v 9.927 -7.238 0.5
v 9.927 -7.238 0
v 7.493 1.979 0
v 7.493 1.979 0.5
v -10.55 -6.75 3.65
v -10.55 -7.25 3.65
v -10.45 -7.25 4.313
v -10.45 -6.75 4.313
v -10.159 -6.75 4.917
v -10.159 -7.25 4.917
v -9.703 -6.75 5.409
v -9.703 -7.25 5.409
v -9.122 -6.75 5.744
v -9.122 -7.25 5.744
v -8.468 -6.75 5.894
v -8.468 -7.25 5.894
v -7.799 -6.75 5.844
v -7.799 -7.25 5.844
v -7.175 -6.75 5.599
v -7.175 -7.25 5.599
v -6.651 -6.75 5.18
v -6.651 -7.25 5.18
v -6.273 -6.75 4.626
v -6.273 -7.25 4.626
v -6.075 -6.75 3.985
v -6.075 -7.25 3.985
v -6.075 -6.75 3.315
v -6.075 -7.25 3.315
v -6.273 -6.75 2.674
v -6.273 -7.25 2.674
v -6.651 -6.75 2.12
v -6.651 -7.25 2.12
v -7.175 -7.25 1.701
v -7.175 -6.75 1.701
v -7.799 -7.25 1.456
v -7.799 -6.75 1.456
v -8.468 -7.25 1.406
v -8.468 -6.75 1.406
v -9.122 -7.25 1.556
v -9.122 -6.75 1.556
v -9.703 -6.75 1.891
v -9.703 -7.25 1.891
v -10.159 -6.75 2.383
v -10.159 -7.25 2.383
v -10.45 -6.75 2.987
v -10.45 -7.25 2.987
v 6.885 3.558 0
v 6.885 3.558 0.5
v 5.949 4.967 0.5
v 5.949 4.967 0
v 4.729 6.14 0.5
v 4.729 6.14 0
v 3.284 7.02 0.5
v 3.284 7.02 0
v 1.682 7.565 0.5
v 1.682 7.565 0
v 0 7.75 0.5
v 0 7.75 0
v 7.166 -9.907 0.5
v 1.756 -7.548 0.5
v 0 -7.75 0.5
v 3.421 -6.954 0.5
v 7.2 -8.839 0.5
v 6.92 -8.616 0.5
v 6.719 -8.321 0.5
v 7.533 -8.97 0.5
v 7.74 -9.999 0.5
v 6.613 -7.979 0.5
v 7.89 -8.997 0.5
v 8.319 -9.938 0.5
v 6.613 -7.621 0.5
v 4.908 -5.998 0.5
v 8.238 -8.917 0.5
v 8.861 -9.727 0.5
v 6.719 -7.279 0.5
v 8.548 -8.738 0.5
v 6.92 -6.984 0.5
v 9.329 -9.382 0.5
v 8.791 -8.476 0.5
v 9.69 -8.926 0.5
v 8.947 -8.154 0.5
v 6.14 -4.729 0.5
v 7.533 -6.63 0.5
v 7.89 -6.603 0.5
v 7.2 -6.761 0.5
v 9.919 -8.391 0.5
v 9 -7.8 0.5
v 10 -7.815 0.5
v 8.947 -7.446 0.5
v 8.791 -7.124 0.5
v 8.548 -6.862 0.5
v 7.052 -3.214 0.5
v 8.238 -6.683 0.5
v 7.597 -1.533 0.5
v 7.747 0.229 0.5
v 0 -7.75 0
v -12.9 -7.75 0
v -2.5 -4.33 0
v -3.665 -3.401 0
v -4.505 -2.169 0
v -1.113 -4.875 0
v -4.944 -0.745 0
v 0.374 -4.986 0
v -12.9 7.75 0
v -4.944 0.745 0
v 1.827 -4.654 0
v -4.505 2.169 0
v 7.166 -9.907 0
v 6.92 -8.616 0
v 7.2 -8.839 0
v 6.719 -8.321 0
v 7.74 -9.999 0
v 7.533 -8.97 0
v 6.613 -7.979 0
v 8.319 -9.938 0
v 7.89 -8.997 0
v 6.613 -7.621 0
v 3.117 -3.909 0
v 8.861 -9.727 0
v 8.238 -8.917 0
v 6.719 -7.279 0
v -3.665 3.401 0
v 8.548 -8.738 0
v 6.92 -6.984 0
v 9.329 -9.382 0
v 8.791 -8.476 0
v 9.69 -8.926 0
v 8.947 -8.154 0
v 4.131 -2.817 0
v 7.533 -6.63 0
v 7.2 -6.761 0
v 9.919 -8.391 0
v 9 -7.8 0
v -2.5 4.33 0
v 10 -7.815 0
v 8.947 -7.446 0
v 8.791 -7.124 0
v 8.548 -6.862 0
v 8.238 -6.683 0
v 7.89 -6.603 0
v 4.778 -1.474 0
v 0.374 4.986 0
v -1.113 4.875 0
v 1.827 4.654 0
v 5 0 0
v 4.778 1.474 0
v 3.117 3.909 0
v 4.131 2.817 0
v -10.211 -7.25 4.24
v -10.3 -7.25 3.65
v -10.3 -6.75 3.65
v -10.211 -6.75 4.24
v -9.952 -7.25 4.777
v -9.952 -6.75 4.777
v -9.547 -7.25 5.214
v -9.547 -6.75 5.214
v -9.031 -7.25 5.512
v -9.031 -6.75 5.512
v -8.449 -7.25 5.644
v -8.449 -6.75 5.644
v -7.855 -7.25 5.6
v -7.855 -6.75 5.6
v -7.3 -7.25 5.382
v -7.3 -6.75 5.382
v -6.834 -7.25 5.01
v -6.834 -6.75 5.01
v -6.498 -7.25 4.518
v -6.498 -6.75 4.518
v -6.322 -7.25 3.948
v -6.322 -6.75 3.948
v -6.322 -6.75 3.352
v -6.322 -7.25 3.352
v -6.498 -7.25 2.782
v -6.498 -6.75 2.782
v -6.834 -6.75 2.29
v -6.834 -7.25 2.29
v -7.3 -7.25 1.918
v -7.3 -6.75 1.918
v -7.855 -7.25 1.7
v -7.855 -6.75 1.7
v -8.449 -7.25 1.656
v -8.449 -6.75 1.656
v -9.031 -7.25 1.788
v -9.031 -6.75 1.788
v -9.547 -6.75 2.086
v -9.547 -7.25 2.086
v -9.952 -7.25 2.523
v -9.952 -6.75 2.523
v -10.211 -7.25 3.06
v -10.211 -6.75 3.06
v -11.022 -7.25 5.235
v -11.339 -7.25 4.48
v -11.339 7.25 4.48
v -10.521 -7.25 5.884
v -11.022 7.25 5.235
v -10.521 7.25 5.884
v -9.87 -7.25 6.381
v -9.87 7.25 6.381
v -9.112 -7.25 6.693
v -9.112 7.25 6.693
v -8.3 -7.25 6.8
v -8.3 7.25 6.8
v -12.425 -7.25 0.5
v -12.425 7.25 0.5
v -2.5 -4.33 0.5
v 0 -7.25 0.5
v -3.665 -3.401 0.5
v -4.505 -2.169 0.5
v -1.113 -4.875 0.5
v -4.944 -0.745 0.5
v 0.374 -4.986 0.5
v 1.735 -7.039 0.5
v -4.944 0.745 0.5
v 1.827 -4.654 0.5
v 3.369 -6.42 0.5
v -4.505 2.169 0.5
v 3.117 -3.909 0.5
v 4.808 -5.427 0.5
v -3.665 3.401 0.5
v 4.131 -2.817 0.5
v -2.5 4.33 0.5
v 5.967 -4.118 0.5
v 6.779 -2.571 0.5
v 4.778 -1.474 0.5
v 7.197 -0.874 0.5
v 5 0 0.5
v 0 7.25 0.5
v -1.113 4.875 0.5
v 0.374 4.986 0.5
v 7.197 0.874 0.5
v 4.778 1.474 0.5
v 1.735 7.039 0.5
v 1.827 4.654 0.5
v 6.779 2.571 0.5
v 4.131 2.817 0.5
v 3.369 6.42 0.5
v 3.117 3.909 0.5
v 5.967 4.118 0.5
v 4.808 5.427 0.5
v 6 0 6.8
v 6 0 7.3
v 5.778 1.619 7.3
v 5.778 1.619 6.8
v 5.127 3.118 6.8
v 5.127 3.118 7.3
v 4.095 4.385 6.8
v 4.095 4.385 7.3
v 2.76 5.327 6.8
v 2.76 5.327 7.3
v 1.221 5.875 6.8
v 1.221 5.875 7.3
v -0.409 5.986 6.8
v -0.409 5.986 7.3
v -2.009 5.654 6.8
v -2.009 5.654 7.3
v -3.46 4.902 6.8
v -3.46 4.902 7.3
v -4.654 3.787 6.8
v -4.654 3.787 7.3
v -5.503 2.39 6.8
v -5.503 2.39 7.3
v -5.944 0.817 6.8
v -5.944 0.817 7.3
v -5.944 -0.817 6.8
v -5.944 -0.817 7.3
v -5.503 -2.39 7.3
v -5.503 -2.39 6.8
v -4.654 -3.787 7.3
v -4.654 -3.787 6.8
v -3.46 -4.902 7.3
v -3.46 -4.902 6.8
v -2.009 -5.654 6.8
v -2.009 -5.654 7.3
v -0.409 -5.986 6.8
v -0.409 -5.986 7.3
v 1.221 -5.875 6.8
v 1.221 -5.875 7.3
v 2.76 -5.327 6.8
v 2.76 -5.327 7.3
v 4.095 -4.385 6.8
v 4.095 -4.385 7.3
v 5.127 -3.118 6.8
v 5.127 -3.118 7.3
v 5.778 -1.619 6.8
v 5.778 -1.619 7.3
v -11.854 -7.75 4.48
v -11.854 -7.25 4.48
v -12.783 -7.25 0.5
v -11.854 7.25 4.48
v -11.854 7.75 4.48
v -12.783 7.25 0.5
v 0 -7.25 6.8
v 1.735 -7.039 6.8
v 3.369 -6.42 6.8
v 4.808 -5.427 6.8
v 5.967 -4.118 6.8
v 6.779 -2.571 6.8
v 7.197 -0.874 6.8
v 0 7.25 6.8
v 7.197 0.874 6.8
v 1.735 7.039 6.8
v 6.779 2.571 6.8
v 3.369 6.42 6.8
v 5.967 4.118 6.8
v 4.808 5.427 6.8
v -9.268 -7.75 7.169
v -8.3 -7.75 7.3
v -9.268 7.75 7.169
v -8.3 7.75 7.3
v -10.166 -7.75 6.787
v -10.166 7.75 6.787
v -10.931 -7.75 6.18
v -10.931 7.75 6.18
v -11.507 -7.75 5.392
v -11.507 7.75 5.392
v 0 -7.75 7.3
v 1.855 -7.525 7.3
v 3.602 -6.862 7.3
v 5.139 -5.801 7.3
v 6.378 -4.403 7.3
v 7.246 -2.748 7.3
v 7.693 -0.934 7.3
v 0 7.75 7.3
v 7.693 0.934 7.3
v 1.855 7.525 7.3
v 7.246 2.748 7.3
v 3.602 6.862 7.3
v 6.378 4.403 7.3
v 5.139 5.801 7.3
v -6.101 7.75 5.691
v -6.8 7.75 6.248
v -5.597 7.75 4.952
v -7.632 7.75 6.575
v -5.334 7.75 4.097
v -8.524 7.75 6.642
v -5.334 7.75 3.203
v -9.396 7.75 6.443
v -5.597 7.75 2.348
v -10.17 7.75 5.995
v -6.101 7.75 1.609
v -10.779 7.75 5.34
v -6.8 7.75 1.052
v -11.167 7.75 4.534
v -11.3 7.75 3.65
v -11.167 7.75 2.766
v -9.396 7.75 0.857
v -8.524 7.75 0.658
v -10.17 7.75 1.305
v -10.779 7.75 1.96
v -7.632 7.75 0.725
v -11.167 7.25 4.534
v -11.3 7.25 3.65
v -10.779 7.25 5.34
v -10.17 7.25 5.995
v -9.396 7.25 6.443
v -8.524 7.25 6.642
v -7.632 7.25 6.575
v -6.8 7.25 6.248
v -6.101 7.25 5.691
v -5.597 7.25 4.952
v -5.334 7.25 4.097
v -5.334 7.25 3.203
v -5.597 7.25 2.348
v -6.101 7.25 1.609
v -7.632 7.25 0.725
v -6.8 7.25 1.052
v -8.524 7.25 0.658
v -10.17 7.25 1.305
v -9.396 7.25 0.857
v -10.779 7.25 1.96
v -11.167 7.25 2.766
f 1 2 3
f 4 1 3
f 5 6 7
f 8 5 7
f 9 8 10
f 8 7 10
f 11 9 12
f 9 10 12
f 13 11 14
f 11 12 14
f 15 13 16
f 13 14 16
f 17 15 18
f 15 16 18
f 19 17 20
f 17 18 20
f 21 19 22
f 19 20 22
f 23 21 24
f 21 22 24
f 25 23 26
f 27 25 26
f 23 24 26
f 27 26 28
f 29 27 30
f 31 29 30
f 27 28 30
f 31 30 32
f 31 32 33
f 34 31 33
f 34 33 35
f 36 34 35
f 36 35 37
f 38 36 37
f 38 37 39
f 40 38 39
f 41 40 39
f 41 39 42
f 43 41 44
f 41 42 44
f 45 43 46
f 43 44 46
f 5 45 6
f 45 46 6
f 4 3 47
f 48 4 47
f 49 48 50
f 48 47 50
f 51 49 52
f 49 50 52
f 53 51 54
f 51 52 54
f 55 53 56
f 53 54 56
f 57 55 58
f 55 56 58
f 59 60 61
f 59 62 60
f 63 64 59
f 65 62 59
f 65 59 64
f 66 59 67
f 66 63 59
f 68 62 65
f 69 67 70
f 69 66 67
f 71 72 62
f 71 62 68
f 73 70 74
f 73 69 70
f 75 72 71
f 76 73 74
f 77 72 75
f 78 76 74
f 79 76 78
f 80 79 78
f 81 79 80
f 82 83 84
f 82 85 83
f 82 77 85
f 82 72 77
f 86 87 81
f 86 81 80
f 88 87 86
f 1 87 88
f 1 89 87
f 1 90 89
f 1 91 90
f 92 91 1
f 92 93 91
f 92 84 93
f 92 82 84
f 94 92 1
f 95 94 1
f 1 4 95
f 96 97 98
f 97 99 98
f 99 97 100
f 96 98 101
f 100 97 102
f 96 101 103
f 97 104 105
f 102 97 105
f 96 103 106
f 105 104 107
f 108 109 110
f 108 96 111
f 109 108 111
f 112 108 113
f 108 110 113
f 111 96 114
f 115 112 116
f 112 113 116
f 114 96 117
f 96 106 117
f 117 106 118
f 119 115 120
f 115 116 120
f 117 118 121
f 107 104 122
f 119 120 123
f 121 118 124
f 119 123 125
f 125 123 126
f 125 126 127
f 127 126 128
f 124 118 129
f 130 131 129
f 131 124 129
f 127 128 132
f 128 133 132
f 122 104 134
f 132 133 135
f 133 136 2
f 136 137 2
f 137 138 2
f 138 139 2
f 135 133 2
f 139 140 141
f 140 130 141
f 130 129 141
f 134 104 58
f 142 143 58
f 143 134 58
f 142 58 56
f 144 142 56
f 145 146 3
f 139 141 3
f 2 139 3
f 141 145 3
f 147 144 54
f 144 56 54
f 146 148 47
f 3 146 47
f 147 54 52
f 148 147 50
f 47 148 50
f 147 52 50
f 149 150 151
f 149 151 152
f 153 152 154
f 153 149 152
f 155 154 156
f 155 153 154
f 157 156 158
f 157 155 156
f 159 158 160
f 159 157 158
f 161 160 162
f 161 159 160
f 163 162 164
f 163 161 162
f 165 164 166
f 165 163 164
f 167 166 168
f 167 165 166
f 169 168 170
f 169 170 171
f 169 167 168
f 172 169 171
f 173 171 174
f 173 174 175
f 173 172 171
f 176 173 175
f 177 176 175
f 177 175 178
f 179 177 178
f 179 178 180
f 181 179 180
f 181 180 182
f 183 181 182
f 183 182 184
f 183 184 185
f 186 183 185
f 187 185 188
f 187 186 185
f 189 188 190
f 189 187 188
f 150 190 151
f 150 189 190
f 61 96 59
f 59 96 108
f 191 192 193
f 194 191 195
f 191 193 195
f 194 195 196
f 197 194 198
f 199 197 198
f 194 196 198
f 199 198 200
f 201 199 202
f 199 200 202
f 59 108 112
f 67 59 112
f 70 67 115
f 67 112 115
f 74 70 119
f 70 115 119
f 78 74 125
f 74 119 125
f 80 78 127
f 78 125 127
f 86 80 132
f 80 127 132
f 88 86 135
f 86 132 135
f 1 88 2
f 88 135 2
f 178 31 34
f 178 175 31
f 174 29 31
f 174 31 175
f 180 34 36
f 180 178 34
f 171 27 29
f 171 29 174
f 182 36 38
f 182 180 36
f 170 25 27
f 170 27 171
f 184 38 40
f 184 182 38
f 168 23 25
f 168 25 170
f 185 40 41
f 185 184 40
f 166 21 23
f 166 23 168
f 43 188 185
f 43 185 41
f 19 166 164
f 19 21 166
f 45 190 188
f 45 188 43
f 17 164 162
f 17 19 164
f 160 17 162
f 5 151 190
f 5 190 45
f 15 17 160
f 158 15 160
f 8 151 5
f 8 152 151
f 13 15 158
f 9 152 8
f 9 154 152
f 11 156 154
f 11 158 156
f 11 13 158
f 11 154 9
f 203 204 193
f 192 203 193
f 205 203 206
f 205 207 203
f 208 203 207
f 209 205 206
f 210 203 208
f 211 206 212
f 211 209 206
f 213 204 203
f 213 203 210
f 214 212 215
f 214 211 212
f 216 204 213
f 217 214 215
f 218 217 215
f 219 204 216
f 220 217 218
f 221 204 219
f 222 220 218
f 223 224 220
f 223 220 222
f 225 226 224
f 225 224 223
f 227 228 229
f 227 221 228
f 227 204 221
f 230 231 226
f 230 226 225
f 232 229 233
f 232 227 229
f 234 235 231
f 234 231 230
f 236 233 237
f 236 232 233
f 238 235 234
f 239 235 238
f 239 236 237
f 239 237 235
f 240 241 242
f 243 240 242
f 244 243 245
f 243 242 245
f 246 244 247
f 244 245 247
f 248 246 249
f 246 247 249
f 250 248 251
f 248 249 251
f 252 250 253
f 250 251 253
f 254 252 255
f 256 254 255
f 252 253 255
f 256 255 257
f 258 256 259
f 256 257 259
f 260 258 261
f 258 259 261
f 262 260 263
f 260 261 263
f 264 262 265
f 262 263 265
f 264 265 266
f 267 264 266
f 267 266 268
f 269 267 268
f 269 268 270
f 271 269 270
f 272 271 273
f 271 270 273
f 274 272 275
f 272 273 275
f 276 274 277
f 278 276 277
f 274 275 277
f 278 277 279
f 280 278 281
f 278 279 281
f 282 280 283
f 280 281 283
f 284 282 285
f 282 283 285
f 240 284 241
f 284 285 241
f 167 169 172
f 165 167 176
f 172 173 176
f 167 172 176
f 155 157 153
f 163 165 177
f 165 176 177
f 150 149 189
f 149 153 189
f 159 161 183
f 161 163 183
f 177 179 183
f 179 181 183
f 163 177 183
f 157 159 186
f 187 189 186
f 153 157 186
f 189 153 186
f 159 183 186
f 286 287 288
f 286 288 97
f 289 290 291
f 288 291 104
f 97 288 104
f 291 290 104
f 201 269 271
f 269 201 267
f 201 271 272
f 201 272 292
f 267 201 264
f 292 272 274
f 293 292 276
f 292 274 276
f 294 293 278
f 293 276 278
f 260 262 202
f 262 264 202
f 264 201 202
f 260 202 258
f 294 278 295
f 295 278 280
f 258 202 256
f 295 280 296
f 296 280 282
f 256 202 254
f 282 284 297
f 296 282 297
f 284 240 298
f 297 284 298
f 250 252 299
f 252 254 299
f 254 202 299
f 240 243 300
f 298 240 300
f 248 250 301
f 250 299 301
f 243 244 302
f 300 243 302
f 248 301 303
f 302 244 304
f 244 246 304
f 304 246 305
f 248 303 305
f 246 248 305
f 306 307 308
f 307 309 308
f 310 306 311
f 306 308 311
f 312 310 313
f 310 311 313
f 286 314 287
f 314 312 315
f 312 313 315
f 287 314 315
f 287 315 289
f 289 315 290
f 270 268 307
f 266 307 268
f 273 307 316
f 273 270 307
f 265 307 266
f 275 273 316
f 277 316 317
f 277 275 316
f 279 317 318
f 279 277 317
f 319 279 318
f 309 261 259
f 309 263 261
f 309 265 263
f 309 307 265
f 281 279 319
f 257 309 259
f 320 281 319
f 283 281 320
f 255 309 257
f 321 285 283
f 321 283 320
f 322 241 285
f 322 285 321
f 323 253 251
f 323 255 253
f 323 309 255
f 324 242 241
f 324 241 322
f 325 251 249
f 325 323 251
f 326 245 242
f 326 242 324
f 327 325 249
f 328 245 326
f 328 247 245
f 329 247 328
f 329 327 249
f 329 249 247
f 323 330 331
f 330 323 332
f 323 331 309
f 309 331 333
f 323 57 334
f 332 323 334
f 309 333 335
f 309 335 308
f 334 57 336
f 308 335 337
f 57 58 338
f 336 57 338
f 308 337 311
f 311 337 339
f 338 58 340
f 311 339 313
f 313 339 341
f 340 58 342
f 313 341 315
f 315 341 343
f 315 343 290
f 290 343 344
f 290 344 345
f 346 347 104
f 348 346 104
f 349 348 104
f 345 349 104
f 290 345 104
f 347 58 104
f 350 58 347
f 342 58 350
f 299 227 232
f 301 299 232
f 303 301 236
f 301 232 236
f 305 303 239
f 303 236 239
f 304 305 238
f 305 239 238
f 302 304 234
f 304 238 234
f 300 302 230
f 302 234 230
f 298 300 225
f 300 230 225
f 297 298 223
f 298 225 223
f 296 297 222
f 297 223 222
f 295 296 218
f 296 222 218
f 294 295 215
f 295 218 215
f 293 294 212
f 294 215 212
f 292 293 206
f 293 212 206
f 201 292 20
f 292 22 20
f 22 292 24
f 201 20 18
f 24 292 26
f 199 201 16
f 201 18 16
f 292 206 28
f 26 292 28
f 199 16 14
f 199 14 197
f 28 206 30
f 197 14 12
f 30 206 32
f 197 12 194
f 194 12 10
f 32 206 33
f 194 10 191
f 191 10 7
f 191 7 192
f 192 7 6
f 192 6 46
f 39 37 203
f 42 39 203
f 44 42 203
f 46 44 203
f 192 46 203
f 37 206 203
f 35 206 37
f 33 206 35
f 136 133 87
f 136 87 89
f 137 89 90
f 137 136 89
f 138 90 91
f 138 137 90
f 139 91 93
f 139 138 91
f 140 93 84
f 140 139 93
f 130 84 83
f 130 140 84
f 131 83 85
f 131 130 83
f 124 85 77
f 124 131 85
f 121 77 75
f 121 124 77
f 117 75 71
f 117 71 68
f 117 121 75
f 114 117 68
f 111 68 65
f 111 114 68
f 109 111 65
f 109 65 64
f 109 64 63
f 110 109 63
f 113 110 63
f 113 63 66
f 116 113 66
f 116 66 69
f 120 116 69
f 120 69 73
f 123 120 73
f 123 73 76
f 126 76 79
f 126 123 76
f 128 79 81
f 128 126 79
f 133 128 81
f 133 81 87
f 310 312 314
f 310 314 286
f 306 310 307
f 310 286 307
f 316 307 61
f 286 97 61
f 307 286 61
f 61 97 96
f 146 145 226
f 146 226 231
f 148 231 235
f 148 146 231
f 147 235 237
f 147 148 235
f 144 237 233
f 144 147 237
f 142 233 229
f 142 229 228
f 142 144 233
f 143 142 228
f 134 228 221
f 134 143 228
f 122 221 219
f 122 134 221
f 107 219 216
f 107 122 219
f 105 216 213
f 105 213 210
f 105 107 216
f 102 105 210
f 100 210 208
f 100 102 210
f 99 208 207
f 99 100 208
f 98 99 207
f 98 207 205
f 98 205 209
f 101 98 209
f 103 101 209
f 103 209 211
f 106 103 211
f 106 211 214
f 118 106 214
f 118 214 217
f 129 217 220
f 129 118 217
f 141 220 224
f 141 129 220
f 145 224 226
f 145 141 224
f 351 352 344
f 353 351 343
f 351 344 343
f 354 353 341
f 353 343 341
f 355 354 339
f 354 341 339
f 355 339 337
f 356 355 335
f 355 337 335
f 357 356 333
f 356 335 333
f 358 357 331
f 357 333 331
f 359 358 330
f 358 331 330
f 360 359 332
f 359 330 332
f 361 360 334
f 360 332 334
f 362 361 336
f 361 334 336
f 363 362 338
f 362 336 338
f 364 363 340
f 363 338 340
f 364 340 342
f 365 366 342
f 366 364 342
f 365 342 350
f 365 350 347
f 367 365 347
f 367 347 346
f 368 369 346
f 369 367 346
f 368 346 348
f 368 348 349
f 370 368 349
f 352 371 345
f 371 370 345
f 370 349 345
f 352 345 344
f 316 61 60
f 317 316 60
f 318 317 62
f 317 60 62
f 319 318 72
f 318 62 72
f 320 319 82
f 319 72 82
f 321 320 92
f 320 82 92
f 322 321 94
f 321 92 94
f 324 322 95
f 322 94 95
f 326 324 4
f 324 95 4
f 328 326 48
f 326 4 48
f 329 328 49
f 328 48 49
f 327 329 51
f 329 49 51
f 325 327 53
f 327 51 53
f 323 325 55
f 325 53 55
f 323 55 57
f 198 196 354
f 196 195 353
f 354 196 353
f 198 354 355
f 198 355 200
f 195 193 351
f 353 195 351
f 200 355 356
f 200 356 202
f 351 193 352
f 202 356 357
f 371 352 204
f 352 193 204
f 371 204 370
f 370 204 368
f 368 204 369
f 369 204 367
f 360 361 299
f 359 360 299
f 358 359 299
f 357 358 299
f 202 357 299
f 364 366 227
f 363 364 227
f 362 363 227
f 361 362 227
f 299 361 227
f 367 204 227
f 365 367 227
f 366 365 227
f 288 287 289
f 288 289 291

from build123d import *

# Parameters (mm, degrees)
F0_R      = 5
F0_R_2    = 1.2
F1_DEPTH  = 0.5
F3_START  = 0.5
F3_DEPTH  = 6.8
F4_R      = 3
F5_DEPTH  = 0.5
F6_R      = 2.25
F6_R_2    = 2
F7_DEPTH  = 0.5
F9_DEPTH  = 17.751
F10_W     = 1.7
F10_H     = 14.5
F11_DEPTH = 25
F13_DEPTH = 14.5
F14_R     = 6
F15_DEPTH = 0.5


with BuildPart() as f1:
    # F0 (on Top) → F1 (new body)
    with BuildSketch(Plane.XY):
        with BuildLine():
            Line((0, 7.75), (-12.9, 7.75))
            Line((-12.9, 7.75), (-12.9, -7.75))
            Line((-12.9, -7.75), (0, -7.75))
            ThreePointArc((0, -7.75), (6.1399336055, -4.729029004), (7.4931417039, 1.978718627))
            ThreePointArc((7.4931417039, 1.978718627), (4.729029004, 6.1399336055), (0, 7.75))
        make_face()
        Circle(F0_R, mode=Mode.SUBTRACT)
        with BuildLine():
            ThreePointArc((7.4931417039, 1.978718627), (6.1399336055, -4.729029004), (0, -7.75))
            Line((0, -7.75), (7.1659829396, -9.9066614268))
            ThreePointArc((7.1659829396, -9.9066614268), (9.3288402344, -9.3819758335), (9.9270853869, -7.2382992285))
            Line((9.9270853869, -7.2382992285), (7.4931417039, 1.978718627))
        make_face()
        with Locations((7.8, -7.8)):
            Circle(F0_R_2, mode=Mode.SUBTRACT)
    extrude(amount=F1_DEPTH)

    # F2 (on Top) → F3 (join)
    with BuildSketch(Plane.XY.offset(F3_START)):
        with BuildLine():
            Line((-12.929528847, 7.75), (-12.929528847, -7.75))
            Line((-12.929528847, -7.75), (0, -7.75))
            ThreePointArc((0, -7.75), (7.75, 0), (0, 7.75))
            Line((0, 7.75), (-12.929528847, 7.75))
        make_face()
        with BuildLine():
            Line((-12.4, -7.25), (-12.4, 7.25))
            Line((-12.4, 7.25), (0, 7.25))
            ThreePointArc((0, 7.25), (7.25, 0), (0, -7.25))
            Line((0, -7.25), (-12.4, -7.25))
        make_face(mode=Mode.SUBTRACT)
    extrude(amount=F3_DEPTH)

    # F4 (on face) → F5 (cut, through all)
    with BuildSketch(Plane(origin=(0, 7.75, 0), x_dir=(-1, 0, 0), z_dir=(0, 1, 0))):
        with Locations((8.3, 3.65)):
            Circle(F4_R)
    extrude(amount=-F5_DEPTH, mode=Mode.SUBTRACT)

    # F6 (on face) → F7 (join)
    with BuildSketch(Plane(origin=(0, -7.25, 0), x_dir=(-1, 0, 0), z_dir=(0, 1, 0))):
        with Locations((8.3, 3.65)):
            Circle(F6_R)
        with Locations((8.3, 3.65)):
            Circle(F6_R_2, mode=Mode.SUBTRACT)
    extrude(amount=F7_DEPTH)

    # F8 (on face) → F9 (cut, through all)
    with BuildSketch(Plane(origin=(0, 7.75, 0), x_dir=(-1, 0, 0), z_dir=(0, 1, 0))):
        with BuildLine():
            Line((15.2742294595, 7.3), (8.3, 7.3))
            ThreePointArc((8.3, 7.3), (10.5687485064, 6.509244693), (11.8544696585, 4.479605597))
            Line((11.8544696585, 4.479605597), (12.9, 0))
            Line((12.9, 0), (15.2742294595, 7.3))
        make_face()
    extrude(amount=-F9_DEPTH, mode=Mode.SUBTRACT)

    # F10 (on face) → F11 (cut)
    with BuildSketch(Plane.XY.offset(0.5)):
        with Locations((-12.05, 0)):
            Rectangle(F10_W, F10_H)
    extrude(amount=F11_DEPTH, mode=Mode.SUBTRACT)

    # F12 (on face) → F13 (join, through all)
    with BuildSketch(Plane.XZ.offset(-7.25)):
        with BuildLine():
            Line((-8.3, 6.8), (-8.3, 7.3))
            ThreePointArc((-8.3, 7.3), (-10.5687485064, 6.509244693), (-11.8544696585, 4.479605597))
            Line((-11.8544696585, 4.479605597), (-12.7833010721, 0.5))
            Line((-12.7833010721, 0.5), (-12.4252442315, 0.5))
            Line((-12.4252442315, 0.5), (-11.3387916272, 4.479605597))
            ThreePointArc((-11.3387916272, 4.479605597), (-10.2117063542, 6.1535732095), (-8.3, 6.8))
        make_face()
    extrude(amount=F13_DEPTH)

    # F14 (on face) → F15 (join)
    with BuildSketch(Plane.XY.offset(7.3)):
        with BuildLine():
            Line((0, 7.25), (-8.3, 7.25))
            Line((-8.3, 7.25), (-8.3, -7.25))
            Line((-8.3, -7.25), (0, -7.25))
            ThreePointArc((0, -7.25), (7.25, 0), (0, 7.25))
        make_face()
        Circle(F14_R, mode=Mode.SUBTRACT)
    extrude(amount=-F15_DEPTH)


solid = f1.part
